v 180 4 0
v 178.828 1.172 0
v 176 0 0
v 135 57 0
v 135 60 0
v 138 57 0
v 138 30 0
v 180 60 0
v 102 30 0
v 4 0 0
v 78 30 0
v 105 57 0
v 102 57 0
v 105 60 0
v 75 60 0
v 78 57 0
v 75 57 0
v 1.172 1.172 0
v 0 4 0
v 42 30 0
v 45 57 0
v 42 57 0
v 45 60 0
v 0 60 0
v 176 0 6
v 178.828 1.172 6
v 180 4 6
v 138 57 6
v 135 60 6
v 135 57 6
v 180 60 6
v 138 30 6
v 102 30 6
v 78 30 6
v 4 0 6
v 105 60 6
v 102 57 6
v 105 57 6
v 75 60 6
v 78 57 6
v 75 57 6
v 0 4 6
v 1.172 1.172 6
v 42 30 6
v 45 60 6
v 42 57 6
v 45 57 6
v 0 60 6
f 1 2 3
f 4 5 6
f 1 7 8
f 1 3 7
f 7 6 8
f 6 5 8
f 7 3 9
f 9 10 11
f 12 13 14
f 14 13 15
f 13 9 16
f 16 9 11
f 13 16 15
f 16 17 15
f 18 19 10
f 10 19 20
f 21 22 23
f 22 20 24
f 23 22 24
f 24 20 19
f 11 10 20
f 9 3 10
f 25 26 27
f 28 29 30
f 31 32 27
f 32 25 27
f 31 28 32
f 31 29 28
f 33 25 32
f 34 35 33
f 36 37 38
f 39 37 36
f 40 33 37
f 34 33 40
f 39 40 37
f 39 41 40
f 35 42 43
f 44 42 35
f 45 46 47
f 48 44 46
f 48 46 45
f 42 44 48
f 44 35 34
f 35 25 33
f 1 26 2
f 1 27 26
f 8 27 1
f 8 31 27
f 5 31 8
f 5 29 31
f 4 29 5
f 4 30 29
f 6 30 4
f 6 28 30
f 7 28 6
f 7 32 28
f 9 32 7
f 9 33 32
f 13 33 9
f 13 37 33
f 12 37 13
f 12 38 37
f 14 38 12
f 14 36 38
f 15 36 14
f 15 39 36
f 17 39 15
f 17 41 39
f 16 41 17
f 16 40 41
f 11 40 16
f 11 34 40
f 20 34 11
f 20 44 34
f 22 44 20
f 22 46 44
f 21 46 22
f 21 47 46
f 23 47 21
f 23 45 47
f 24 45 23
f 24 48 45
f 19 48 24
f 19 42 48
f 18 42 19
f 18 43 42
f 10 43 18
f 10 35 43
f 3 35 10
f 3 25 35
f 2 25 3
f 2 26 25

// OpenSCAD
$fn = 32;

// ----------------------------------------------------------------------
// Oversize slot bar: 180 mm bar with 2 oversize windows
// ----------------------------------------------------------------------

// --- parameters (mm) ---
profile_height = 6;       // extrusion height
profile_points = 24;      // points of the closed outline

profile = [[0, 4], [1.172, 1.172], [4, 0], [176, 0], [178.828, 1.172], [180, 4], [180, 60], [135, 60], [135, 57], [138, 57], [138, 30], [102, 30], [102, 57], [105, 57], [105, 60], [75, 60], [75, 57], [78, 57], [78, 30], [42, 30], [42, 57], [45, 57], [45, 60], [0, 60]];  // single closed polygon, 24 points, counter clockwise

// --- the one profile operation ---
linear_extrude(height = profile_height) polygon(points = profile);
